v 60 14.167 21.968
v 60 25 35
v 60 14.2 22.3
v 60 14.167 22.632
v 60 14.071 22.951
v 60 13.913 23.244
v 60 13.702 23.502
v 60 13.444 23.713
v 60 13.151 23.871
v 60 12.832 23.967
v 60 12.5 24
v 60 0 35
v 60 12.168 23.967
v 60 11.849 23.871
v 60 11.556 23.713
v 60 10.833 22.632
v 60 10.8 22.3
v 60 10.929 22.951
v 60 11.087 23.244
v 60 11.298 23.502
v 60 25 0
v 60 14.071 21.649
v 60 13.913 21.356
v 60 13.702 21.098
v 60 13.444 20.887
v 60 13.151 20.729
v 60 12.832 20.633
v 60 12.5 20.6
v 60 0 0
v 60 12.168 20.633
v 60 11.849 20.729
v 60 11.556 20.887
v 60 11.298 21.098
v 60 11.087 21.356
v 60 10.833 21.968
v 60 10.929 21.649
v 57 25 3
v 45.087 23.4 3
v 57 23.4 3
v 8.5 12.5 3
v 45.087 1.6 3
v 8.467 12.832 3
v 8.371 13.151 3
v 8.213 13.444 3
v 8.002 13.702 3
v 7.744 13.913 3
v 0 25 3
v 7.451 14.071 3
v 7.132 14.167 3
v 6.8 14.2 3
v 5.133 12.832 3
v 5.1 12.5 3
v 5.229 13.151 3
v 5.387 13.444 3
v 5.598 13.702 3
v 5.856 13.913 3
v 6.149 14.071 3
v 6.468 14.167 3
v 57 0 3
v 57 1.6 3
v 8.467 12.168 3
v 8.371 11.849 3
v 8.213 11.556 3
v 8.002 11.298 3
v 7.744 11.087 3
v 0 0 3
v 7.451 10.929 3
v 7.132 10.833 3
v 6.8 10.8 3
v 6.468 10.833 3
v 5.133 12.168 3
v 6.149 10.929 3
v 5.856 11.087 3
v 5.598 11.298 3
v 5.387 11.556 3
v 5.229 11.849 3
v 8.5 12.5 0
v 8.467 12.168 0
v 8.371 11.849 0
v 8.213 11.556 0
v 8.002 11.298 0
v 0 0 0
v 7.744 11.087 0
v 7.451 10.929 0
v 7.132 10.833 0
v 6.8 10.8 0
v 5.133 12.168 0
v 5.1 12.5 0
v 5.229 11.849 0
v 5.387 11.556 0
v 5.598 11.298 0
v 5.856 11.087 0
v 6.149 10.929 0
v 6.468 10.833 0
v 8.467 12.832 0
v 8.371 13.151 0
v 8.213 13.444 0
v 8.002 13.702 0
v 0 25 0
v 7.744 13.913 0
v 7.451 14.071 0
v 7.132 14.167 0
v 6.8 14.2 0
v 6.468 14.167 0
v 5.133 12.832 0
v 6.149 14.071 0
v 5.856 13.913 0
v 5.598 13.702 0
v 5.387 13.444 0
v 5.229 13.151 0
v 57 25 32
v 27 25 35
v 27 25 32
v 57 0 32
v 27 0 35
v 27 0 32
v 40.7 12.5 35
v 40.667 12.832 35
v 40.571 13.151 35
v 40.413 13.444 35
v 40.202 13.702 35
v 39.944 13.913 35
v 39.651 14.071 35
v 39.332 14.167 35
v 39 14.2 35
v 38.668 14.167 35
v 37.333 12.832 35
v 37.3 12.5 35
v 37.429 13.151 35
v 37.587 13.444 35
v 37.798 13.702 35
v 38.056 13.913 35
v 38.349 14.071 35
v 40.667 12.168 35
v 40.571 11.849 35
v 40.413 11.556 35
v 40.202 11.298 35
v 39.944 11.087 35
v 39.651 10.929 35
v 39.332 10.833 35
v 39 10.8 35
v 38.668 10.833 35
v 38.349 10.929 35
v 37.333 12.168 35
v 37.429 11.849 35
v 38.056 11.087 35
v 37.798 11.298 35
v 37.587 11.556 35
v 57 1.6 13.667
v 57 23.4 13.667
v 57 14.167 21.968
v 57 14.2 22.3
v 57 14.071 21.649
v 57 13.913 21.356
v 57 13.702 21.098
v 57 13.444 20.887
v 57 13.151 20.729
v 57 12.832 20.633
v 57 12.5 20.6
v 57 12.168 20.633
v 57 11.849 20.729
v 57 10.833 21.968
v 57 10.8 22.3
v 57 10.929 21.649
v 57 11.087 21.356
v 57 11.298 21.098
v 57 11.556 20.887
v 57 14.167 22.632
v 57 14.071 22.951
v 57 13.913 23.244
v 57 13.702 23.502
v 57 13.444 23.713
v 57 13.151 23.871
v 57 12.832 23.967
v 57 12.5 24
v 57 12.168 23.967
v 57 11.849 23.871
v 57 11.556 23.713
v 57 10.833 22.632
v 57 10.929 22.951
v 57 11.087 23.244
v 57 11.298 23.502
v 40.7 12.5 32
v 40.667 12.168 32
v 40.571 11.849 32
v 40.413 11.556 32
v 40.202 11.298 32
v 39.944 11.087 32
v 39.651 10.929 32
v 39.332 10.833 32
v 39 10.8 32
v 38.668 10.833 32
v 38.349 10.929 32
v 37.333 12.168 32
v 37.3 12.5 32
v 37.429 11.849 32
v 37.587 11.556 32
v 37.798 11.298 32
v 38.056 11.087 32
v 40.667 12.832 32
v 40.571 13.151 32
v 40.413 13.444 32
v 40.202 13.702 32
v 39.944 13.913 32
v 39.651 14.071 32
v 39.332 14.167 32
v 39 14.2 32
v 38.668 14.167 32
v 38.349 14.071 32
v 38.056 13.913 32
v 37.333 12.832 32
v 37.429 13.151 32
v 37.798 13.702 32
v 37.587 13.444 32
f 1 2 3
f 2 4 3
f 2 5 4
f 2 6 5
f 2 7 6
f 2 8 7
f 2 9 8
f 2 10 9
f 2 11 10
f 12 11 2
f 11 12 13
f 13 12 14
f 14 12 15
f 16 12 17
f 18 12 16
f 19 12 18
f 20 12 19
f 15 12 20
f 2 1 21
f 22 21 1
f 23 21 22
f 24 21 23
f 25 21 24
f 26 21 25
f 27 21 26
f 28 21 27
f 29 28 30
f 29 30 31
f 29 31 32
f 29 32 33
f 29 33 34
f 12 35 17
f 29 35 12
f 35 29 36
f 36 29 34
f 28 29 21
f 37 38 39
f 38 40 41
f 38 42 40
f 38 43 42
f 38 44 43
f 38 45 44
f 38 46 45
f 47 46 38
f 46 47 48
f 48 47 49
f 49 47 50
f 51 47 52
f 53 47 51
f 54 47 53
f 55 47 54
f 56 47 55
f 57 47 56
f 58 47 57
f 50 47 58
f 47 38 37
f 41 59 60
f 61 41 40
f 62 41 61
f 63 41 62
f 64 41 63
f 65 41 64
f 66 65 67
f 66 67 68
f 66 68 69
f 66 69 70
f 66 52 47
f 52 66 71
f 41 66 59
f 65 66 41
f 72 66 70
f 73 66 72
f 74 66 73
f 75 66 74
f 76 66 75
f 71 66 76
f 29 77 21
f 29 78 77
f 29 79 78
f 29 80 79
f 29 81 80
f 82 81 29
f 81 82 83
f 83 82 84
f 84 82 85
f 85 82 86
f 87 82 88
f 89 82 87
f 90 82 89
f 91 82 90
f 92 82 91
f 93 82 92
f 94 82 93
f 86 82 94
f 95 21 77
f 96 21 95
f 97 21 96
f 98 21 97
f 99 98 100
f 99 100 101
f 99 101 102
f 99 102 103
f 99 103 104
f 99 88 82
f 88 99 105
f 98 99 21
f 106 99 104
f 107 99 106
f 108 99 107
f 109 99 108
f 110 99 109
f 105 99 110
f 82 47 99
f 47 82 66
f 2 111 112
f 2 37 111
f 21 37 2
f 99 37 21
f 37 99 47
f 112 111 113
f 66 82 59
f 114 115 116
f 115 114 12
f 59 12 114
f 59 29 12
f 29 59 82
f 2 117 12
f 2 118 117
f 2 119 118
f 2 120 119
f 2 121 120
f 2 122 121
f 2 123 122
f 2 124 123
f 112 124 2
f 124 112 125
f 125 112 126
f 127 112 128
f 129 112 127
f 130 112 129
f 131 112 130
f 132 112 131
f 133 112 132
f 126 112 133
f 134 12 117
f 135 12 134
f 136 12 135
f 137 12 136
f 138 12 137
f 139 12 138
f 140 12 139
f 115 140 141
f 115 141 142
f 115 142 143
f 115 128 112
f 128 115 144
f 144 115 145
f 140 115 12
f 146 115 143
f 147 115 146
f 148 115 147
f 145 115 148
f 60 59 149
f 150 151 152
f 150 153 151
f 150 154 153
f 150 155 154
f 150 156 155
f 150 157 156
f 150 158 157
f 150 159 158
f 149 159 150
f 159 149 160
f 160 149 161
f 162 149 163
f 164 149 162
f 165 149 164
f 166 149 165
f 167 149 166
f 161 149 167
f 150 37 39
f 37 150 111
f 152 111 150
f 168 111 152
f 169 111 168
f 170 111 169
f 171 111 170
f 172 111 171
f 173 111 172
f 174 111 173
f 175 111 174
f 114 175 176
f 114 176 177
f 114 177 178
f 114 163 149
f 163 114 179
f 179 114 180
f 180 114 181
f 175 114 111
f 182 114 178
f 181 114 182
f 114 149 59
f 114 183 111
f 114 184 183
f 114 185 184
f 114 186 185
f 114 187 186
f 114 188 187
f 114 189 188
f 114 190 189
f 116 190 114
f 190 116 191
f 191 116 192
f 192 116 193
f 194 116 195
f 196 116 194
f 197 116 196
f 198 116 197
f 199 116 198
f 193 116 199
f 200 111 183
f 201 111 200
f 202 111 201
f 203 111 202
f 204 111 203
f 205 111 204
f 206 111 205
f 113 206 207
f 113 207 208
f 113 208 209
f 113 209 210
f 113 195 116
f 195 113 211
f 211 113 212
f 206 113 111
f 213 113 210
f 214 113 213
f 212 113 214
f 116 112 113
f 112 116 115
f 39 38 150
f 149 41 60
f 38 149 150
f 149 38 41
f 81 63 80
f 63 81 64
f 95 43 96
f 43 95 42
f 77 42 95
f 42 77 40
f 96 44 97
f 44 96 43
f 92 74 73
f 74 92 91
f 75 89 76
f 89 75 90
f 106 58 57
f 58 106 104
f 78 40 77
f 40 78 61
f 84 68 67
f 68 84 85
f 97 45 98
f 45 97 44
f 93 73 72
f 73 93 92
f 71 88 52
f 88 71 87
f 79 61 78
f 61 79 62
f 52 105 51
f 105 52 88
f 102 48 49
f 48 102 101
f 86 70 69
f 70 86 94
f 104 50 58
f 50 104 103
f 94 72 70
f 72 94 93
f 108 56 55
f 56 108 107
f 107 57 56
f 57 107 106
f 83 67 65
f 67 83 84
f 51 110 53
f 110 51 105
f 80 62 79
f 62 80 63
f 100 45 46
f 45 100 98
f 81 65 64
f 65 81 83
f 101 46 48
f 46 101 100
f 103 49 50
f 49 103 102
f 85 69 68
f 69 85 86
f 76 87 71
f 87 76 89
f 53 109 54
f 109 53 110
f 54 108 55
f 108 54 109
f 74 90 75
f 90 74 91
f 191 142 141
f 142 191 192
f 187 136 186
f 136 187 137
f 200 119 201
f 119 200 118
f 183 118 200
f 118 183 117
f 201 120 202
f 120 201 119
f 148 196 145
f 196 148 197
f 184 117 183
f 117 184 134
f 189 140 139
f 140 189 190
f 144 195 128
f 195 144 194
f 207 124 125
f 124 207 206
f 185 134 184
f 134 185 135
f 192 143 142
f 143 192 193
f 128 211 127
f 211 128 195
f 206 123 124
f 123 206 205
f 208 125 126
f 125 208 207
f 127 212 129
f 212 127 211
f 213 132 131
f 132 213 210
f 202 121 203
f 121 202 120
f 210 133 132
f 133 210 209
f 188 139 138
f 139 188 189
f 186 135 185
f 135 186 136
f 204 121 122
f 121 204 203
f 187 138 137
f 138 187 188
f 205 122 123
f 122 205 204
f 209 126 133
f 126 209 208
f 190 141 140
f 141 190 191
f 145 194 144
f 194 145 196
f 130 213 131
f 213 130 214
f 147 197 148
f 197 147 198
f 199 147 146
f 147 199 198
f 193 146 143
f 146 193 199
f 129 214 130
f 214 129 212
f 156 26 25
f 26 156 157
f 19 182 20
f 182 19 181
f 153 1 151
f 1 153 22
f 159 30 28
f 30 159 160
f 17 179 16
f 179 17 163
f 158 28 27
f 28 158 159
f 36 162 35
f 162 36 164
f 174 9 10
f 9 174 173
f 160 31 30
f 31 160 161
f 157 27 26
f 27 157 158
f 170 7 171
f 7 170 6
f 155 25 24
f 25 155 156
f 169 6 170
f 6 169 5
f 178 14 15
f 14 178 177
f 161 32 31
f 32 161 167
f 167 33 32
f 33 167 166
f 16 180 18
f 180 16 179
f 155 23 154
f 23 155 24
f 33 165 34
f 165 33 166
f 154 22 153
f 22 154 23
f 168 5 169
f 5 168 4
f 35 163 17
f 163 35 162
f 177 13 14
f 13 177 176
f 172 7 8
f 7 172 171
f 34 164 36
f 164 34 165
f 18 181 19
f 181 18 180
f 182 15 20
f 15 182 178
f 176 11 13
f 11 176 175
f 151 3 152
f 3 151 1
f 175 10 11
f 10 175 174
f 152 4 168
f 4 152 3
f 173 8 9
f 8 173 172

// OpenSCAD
$fn = 32;

// ----------------------------------------------------------------------
// Z-bracket: 60 x 25 x 35 mm
// ----------------------------------------------------------------------

// --- parameters (mm) ---
bottom_run = 60;          // lower foot length, X
top_run = 30;             // upper foot length, X
profile_w = 25;           // bracket width, Y
height = 35;              // overall rise, Z
mat_t = 3;                // plate thickness
hole_d = 3.4;             // clearance for M3
rib_len = 13.7;           // gusset leg
rib_sink = 1.6;           // gusset overlap into the plates

module hole_z(px, py, z0) {
  translate([px, py, z0 - 2.5]) cylinder(h = mat_t + 5, d = hole_d);
}
module hole_x(py, pz) {
  translate([-2.5, py, pz]) rotate([0, 90, 0]) cylinder(h = mat_t + 5, d = hole_d);
}
module gusset(x0) {
  translate([x0, profile_w - rib_sink, 0])
    rotate([90, 0, 0])
      linear_extrude(height = profile_w - 2 * rib_sink)
        polygon(points = [[rib_sink, mat_t - rib_sink],
                          [rib_sink, mat_t - rib_sink + rib_len],
                          [-rib_len, mat_t - rib_sink]]);
}

difference() {
  union() {
    cube([bottom_run, profile_w, mat_t]);
    /* web, overlapping the lower foot */
    translate([bottom_run - mat_t, 0, 0]) cube([mat_t, profile_w, height]);
    /* upper foot, sunk into the web */
    translate([bottom_run - mat_t - top_run, 0, height - mat_t]) cube([top_run + mat_t, profile_w, mat_t]);
    gusset(bottom_run - mat_t);
  }
  hole_z(6.8, 12.5, 0);
  translate([bottom_run - mat_t - 18, 0, 0]) hole_z(0, 12.5, height - mat_t);
  translate([bottom_run - mat_t, 0, 0]) hole_x(12.5, 22.3);
}
